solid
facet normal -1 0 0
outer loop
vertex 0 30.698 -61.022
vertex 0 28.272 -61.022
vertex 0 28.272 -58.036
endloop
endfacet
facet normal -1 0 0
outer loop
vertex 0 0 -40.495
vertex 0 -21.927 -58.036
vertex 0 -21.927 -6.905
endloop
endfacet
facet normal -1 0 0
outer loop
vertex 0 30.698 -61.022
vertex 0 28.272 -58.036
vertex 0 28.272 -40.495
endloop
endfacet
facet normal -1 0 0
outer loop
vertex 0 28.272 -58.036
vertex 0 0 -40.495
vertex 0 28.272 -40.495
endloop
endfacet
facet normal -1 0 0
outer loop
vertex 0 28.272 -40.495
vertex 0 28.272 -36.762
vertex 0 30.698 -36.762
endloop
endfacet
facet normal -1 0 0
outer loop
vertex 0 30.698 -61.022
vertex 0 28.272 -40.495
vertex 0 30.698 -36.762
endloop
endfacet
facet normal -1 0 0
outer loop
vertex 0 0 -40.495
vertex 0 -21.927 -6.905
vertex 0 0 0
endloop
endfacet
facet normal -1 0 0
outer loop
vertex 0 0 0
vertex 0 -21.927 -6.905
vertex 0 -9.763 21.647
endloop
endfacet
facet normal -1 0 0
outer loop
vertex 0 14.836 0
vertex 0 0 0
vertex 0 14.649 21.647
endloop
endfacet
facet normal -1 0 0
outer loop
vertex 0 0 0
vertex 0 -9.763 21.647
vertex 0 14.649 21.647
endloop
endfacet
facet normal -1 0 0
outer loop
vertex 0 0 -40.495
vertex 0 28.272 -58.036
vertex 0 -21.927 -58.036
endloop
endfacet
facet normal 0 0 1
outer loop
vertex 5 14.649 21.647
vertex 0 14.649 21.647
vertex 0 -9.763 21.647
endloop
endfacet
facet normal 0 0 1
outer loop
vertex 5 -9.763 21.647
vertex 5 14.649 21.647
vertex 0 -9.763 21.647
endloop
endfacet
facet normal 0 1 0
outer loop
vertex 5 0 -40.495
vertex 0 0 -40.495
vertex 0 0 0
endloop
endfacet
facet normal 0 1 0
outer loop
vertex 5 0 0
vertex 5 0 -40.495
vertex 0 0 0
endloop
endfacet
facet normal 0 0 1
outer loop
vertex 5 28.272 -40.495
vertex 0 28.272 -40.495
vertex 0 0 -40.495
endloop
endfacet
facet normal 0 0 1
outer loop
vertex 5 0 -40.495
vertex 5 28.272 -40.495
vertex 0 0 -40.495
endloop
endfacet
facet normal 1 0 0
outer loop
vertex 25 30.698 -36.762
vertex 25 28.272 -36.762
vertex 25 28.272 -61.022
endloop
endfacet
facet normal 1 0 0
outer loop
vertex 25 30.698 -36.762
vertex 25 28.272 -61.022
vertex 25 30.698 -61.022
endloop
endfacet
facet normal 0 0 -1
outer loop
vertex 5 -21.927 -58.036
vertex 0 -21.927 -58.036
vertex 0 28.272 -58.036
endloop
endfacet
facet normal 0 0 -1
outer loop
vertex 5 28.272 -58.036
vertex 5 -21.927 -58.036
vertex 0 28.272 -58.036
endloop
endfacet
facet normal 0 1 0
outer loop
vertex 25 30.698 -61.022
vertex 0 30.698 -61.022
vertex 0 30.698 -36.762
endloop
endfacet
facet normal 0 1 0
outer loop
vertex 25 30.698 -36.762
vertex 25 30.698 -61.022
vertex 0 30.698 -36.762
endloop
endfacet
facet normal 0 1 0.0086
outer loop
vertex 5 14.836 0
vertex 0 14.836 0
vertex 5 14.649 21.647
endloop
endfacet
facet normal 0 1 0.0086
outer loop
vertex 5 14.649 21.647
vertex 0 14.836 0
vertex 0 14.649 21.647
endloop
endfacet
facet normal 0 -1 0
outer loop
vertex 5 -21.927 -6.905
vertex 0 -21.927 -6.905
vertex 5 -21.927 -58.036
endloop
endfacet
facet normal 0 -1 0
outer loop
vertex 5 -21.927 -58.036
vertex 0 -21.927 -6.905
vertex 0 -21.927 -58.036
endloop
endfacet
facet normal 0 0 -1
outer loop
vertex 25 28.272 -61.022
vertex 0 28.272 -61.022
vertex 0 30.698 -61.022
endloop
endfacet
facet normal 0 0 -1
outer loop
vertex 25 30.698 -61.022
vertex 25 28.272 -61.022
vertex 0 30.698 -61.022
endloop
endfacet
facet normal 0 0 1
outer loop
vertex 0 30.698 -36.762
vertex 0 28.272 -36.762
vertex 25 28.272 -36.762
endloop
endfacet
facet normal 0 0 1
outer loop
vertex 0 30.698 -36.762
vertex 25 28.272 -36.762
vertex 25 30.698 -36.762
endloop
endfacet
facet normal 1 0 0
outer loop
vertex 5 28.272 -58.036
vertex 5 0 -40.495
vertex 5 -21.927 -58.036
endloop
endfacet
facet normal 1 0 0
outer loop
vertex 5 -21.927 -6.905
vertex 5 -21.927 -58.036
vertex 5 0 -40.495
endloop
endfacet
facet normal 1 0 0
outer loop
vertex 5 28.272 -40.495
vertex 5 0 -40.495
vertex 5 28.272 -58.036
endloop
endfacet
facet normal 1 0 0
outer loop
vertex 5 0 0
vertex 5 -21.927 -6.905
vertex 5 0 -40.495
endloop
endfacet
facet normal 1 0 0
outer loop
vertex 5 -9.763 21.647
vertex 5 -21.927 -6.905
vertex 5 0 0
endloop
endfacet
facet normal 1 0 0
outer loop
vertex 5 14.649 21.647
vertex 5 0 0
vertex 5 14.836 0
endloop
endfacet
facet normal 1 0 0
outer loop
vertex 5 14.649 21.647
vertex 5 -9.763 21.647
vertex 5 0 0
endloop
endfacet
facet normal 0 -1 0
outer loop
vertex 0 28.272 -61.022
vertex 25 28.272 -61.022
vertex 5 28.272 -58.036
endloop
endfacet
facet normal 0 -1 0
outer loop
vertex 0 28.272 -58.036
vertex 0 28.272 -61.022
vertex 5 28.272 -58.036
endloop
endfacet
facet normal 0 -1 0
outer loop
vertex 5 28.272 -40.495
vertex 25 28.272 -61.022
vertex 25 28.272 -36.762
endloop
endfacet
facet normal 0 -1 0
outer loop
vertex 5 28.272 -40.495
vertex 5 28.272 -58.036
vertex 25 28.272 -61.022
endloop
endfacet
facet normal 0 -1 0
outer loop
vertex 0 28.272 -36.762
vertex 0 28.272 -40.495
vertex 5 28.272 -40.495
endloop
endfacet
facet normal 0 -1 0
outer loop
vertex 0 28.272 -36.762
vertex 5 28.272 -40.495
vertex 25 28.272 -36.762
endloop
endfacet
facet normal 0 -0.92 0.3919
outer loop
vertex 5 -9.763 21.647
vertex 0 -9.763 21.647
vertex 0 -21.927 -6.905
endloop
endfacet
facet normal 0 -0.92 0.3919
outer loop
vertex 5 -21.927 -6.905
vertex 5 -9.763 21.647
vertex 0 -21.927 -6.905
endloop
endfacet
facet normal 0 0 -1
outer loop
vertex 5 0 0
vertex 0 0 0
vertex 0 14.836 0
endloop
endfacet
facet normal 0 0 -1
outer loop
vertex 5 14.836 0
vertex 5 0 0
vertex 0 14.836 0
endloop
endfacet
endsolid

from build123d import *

# Parameters (mm, degrees)
F1_DEPTH = 5
F2_W     = 2.42595
F2_H     = 24.259482
F3_DEPTH = 25


with BuildPart() as f1:
    # F0 (on Right) → F1 (new body)
    with BuildSketch(Plane.YZ):
        Polygon((14.835605, 0), (14.648993, 21.646921), (-9.762866, 21.646921), (-21.926837, -6.904621), (-21.926837, -58.036141), (28.271621, -58.036141), (28.271621, -40.494673), (0, -40.494673), (0, 0), align=None)
    extrude(amount=F1_DEPTH)

    # F2 (on Right) → F3 (join)
    with BuildSketch(Plane.YZ):
        with Locations((29.484596, -48.892183)):
            Rectangle(F2_W, F2_H)
    extrude(amount=F3_DEPTH)


solid = f1.part
